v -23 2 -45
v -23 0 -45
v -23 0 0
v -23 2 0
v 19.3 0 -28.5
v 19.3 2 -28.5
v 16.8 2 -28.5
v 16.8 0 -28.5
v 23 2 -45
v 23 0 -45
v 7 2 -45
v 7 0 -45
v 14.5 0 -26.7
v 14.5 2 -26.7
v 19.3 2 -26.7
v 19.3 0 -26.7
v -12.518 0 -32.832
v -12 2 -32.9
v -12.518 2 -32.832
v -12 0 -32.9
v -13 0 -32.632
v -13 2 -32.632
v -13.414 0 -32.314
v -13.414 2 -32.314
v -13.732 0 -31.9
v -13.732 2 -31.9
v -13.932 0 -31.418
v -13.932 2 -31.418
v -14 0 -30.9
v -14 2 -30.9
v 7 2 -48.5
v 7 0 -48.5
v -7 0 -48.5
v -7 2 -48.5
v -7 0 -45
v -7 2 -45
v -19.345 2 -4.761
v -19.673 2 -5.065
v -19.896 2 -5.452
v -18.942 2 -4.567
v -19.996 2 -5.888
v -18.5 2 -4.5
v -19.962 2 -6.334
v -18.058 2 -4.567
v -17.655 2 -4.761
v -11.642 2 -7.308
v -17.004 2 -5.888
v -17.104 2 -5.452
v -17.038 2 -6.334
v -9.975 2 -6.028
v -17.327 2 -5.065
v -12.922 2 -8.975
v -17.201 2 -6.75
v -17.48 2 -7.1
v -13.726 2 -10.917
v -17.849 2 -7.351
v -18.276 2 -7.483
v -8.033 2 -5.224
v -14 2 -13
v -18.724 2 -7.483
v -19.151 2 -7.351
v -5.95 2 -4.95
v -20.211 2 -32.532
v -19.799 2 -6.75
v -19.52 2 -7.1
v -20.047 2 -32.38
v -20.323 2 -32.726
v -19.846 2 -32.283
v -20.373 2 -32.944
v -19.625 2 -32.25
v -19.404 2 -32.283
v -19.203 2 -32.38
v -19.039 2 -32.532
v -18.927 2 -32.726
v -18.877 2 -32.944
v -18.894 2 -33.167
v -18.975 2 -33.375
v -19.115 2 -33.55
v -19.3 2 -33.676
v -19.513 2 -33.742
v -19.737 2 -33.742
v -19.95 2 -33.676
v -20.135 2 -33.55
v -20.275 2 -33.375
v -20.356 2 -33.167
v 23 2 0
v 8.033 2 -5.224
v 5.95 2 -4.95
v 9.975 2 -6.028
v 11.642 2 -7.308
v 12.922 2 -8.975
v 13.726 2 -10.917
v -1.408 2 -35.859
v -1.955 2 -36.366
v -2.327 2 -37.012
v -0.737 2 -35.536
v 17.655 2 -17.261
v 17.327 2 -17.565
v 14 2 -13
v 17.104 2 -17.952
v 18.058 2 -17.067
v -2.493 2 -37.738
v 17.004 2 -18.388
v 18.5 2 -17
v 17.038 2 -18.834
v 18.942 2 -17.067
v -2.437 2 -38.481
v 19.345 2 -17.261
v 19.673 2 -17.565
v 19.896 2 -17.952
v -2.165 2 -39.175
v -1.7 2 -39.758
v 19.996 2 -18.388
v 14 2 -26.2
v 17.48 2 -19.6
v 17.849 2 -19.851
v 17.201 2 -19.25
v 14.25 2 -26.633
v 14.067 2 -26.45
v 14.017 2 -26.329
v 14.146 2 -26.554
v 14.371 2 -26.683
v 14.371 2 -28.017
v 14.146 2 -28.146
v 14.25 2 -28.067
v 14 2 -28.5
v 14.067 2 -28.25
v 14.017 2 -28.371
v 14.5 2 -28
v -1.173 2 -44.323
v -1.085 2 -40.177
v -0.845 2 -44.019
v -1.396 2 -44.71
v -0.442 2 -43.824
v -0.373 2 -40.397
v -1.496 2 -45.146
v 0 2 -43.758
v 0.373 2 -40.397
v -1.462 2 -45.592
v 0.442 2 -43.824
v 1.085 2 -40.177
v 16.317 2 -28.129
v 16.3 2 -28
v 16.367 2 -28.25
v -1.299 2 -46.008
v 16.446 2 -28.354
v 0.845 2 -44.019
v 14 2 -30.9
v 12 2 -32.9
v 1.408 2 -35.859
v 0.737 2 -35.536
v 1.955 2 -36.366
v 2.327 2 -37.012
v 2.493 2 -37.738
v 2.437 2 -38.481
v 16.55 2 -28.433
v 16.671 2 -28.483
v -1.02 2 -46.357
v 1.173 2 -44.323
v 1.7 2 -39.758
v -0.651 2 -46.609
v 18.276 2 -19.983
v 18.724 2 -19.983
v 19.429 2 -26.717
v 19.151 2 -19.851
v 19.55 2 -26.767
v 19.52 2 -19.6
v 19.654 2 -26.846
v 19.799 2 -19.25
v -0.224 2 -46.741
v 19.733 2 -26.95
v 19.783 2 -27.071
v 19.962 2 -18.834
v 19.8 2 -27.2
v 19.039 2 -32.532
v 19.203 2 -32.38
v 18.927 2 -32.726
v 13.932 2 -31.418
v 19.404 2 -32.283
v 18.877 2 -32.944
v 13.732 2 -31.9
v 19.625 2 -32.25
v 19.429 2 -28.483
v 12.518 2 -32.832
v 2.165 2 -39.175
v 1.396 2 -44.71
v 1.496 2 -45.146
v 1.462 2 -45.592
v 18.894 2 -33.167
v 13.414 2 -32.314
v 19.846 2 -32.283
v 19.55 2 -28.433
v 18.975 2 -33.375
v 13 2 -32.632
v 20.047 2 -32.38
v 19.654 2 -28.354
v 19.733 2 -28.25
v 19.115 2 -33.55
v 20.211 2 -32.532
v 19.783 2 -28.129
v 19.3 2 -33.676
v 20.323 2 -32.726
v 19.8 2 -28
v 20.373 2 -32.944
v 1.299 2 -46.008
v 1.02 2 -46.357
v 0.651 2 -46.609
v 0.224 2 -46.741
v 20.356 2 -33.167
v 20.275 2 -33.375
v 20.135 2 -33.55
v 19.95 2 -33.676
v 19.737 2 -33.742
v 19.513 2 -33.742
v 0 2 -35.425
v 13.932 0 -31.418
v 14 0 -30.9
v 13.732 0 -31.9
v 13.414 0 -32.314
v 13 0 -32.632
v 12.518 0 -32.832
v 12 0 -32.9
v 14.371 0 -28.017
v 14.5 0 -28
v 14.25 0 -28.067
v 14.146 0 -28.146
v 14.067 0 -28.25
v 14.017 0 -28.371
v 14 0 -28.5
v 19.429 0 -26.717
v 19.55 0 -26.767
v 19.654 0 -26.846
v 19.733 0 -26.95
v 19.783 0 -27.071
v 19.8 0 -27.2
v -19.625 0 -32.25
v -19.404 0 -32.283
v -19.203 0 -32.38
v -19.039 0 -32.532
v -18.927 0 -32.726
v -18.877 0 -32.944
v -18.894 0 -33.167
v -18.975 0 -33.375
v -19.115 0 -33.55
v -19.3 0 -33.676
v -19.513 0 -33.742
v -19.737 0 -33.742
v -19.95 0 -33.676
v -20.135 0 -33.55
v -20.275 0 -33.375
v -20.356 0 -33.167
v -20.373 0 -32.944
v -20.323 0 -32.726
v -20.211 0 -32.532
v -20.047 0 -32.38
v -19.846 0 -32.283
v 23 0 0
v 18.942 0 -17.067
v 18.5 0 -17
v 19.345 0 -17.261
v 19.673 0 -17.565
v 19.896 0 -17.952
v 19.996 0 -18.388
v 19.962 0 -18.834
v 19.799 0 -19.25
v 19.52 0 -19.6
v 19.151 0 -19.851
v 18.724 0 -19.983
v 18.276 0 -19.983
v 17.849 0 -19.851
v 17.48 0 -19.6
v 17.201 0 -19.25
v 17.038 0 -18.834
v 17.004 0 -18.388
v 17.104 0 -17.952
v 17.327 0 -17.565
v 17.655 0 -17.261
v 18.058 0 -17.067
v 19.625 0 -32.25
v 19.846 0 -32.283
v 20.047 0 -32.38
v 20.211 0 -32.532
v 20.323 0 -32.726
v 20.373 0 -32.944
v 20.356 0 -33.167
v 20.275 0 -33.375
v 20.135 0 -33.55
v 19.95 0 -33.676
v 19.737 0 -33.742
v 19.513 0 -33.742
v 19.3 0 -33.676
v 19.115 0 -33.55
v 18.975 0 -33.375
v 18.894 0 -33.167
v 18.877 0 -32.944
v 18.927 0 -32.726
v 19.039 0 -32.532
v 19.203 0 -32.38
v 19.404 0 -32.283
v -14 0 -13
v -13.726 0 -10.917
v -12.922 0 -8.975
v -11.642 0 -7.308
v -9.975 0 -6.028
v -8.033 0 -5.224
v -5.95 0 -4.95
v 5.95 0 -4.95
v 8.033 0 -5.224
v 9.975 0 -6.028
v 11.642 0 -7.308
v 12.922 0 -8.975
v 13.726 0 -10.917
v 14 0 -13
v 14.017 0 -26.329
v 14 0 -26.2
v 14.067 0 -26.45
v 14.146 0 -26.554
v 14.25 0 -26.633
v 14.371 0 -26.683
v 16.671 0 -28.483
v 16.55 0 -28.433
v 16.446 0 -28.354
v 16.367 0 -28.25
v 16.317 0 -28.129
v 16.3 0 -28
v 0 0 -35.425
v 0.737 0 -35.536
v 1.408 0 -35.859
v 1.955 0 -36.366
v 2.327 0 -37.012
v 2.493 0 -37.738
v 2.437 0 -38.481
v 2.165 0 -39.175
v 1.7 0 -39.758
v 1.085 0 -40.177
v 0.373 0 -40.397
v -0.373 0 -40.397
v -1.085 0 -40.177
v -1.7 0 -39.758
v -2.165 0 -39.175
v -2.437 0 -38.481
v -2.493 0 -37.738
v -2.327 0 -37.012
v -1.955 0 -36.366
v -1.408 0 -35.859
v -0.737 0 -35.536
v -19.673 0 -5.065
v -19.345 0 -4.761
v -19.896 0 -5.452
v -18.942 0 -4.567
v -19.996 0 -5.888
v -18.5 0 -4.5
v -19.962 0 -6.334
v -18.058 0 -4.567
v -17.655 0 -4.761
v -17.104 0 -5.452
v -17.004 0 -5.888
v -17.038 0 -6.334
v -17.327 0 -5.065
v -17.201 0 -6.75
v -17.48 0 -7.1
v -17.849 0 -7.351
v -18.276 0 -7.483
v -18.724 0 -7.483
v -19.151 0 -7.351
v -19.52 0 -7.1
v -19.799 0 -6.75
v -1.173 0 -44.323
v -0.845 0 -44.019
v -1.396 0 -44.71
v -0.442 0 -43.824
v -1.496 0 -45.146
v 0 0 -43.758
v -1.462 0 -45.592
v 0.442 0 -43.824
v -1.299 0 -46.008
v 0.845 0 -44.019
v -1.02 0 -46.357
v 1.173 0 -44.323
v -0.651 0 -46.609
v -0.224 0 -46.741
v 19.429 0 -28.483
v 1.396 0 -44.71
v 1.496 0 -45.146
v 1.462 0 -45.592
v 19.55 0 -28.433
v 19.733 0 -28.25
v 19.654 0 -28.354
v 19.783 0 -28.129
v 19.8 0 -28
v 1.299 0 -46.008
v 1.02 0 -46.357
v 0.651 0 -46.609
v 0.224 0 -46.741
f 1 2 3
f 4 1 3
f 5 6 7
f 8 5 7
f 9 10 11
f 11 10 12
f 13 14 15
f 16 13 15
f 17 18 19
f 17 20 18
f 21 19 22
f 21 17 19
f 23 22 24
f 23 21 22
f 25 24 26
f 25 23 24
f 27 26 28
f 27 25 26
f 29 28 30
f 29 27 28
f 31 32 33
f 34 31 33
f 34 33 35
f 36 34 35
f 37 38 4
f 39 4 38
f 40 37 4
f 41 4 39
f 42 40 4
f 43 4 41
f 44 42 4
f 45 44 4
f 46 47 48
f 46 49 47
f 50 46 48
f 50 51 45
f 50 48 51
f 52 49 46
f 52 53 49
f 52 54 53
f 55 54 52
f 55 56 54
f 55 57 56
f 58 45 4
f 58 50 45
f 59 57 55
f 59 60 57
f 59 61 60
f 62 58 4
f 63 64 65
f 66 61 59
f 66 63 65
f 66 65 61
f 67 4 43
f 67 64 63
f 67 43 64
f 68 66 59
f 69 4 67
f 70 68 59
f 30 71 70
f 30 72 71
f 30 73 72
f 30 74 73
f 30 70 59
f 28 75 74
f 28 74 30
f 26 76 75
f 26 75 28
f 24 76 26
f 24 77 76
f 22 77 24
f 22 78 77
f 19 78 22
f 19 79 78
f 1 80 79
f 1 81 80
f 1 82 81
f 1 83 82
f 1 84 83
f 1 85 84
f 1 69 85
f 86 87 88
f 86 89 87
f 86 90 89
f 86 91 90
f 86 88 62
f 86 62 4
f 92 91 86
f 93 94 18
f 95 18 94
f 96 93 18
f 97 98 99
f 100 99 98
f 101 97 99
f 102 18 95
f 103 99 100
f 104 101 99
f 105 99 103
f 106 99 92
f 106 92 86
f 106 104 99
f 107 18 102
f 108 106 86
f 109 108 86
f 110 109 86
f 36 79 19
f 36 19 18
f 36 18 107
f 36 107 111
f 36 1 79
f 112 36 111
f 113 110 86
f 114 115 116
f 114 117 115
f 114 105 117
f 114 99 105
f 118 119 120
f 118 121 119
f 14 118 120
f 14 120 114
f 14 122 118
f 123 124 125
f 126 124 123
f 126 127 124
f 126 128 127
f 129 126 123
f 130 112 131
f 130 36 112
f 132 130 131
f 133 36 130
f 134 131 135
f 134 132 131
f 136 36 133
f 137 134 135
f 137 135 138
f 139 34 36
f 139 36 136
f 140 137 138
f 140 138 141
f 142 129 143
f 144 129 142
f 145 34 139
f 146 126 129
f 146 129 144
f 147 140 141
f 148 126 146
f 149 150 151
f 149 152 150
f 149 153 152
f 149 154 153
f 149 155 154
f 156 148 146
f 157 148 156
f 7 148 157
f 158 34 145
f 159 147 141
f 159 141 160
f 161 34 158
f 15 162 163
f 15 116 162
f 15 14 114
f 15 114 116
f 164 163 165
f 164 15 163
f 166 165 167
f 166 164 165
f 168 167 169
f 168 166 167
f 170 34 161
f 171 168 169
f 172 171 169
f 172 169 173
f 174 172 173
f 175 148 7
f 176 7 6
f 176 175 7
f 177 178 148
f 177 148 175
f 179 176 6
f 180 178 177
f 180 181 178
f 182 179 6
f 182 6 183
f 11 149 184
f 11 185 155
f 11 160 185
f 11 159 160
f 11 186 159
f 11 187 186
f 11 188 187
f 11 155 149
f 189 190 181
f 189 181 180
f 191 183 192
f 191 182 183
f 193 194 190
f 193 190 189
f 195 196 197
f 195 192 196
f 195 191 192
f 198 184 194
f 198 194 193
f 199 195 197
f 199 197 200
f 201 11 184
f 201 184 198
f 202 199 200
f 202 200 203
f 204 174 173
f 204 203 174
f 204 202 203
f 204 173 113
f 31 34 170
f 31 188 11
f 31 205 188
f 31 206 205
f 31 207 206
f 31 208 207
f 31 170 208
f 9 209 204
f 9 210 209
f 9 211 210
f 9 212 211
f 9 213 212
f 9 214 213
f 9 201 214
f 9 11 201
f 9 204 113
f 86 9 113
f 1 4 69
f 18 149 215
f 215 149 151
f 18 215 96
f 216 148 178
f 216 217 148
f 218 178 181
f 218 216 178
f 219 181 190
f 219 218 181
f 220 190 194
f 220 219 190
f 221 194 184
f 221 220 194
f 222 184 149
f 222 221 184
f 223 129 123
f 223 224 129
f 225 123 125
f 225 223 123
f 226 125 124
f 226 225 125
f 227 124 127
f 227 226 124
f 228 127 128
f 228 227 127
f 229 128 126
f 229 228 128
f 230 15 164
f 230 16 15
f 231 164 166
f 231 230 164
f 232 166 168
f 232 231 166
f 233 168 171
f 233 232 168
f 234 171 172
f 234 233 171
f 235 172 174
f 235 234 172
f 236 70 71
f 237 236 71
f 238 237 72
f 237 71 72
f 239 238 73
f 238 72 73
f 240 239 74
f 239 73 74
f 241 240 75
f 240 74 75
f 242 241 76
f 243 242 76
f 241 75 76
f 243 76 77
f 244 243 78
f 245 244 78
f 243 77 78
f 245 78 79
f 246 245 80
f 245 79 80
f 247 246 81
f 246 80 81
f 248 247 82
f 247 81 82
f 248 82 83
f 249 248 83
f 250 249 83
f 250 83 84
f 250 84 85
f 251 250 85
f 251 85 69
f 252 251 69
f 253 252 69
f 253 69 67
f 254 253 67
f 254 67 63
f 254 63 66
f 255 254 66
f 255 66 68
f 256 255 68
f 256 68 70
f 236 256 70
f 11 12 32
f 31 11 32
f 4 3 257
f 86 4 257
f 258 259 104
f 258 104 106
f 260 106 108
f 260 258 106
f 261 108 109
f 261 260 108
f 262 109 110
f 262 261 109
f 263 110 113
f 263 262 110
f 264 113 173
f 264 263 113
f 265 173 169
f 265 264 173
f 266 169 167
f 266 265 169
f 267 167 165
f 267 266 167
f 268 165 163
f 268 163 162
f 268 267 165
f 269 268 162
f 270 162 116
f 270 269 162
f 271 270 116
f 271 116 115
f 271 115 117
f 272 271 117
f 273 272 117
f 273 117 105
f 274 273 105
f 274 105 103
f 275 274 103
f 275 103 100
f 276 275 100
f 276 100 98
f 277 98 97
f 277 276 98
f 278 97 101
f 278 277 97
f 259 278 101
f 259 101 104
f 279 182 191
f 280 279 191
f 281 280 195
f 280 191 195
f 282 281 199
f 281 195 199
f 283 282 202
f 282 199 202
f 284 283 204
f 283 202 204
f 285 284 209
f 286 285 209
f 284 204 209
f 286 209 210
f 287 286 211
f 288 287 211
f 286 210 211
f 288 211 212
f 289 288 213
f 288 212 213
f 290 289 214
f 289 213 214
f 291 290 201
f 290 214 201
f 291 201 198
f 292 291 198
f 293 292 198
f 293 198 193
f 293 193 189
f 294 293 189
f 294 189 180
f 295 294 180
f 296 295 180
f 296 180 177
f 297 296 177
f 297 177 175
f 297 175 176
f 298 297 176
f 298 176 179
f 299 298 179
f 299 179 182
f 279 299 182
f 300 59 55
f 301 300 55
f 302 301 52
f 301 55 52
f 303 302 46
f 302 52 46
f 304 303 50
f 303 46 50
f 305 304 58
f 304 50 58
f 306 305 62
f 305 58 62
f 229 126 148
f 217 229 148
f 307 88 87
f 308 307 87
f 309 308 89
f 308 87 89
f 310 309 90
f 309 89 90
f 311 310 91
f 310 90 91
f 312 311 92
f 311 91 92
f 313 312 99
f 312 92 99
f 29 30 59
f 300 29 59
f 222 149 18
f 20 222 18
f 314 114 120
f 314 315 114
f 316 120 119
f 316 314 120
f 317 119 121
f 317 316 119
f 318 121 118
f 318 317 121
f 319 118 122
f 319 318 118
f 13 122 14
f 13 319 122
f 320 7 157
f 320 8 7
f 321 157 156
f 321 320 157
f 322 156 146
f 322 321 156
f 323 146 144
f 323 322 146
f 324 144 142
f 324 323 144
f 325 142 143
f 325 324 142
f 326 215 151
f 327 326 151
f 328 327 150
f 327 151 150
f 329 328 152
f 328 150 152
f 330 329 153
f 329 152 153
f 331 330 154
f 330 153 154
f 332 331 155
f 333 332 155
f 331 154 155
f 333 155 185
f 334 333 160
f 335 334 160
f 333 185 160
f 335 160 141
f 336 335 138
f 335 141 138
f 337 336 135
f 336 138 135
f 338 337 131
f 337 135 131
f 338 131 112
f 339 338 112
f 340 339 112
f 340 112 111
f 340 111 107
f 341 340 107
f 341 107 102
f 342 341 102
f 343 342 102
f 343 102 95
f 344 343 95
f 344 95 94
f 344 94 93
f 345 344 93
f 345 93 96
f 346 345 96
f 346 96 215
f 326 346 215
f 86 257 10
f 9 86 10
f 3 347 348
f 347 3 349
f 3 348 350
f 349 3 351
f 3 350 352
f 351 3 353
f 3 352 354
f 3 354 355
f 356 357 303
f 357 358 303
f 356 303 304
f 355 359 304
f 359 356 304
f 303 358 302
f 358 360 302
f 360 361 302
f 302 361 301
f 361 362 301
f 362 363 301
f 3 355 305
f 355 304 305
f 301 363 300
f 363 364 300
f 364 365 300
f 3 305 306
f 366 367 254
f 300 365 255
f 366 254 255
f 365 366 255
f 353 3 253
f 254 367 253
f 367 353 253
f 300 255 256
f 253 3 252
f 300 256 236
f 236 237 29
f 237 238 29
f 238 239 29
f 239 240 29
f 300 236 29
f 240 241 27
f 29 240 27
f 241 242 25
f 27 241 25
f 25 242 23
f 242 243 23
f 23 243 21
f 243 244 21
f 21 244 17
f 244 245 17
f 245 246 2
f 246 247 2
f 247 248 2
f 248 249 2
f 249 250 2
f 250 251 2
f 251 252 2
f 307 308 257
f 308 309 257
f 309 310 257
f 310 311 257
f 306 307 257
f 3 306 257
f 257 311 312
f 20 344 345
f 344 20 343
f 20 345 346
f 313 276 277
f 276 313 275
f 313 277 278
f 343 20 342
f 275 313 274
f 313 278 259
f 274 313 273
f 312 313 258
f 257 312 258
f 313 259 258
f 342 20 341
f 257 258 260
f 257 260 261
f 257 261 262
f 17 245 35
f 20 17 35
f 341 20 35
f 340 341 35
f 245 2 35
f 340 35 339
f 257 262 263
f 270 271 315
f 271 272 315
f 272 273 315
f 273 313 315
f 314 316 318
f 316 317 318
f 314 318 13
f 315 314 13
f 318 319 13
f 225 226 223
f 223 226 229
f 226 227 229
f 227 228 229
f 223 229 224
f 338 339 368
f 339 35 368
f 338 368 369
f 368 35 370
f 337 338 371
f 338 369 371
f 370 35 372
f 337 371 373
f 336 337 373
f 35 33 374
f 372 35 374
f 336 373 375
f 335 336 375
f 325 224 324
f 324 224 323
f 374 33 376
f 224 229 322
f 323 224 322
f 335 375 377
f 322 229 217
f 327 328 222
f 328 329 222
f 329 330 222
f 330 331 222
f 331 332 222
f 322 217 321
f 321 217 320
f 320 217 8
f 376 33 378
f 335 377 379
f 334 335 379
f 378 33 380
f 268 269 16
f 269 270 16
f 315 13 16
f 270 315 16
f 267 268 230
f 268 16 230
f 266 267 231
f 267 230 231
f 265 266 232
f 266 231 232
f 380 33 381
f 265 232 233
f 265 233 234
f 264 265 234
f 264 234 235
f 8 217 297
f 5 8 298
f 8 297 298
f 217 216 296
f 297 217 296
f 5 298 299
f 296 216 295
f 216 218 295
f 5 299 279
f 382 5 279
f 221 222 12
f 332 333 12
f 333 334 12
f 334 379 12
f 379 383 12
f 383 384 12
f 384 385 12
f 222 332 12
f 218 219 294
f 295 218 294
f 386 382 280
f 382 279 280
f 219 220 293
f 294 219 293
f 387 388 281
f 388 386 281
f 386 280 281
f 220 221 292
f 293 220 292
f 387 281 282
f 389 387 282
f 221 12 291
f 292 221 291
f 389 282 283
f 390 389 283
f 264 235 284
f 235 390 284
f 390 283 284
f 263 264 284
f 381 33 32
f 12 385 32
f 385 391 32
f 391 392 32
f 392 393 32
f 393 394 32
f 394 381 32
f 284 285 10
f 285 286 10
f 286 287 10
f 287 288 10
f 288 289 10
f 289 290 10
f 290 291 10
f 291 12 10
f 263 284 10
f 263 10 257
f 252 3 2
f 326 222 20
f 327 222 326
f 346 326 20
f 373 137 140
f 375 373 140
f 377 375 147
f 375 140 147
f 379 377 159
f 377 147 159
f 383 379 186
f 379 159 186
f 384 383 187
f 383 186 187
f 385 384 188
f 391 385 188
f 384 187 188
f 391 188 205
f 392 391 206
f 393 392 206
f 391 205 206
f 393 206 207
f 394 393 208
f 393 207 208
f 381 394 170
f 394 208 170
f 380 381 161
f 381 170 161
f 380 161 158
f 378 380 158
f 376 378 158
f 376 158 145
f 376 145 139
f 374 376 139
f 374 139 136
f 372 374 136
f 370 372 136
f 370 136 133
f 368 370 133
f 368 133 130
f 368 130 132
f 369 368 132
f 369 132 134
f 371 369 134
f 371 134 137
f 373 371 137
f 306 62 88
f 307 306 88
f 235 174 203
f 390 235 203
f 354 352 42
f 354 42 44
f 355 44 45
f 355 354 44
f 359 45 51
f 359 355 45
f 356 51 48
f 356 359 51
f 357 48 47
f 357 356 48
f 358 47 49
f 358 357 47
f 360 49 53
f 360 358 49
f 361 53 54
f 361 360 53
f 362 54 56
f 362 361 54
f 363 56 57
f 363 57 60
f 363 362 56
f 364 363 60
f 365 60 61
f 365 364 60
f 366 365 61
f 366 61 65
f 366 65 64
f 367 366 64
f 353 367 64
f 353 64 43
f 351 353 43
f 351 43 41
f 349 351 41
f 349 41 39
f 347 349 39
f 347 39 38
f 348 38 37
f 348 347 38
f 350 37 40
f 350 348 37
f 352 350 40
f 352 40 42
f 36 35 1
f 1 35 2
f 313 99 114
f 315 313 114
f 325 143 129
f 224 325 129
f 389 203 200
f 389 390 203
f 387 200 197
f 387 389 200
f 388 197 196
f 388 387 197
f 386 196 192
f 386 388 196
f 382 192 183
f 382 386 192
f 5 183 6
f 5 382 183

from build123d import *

# Parameters (mm, degrees)
SKETCH1_R          = 1.5
EXTRUDE1_DEPTH     = 2
CUT_EXTRUDE1_DEPTH = 2
FILLET1_R          = 2
CUT_EXTRUDE3_REACH = 55.715
SKETCH3_R          = 1.5
SKETCH3_R_2        = 0.75
SKETCH3_R_3        = 2.5
CUT_EXTRUDE4_REACH = 55.715
FILLET2_R          = 0.5


with BuildPart() as part:
    # Sketch1 → Extrude1 (new body)
    with BuildSketch(Plane(origin=(0, 0, 0), x_dir=(1, 0, 0), z_dir=(0, 1, 0))):
        Polygon((-23, 0), (23, 0), (23, 45), (7, 45), (7, 48.5), (-7, 48.5), (-7, 45), (-23, 45), align=None)
        with Locations(Location((-18.5, 6, 0), (0, 0, 270))):
            Circle(SKETCH1_R, mode=Mode.SUBTRACT)
        with Locations(Location((18.5, 18.5, 0), (0, 0, 270))):
            Circle(SKETCH1_R, mode=Mode.SUBTRACT)
    extrude(amount=EXTRUDE1_DEPTH)

    # Sketch2 → Cut-Extrude1 (cut)
    with BuildSketch(Plane(origin=(0, 2, 0), x_dir=(1, 0, 0), z_dir=(0, 1, 0))):
        with BuildLine():
            Line((-5.95, 4.95), (5.95, 4.95))
            ThreePointArc((5.95, 4.95), (11.642209589, 7.307790411), (14, 13))
            Line((14, 13), (14, 32.9))
            Line((14, 32.9), (-14, 32.9))
            Line((-14, 32.9), (-14, 13))
            ThreePointArc((-14, 13), (-11.642209589, 7.307790411), (-5.95, 4.95))
        make_face()
    extrude(amount=-CUT_EXTRUDE1_DEPTH, mode=Mode.SUBTRACT)

    # Fillet1
    fillet1_edges = [part.edges().sort_by_distance(p)[0] for p in [
        (-14, 1, -32.9),
        (14, 1, -32.9),
    ]]
    fillet(fillet1_edges, radius=FILLET1_R)

    # Sketch3 → Cut-Extrude3 (cut, up to next)
    with BuildSketch(Plane(origin=(0, 2, 0), x_dir=(1, 0, 0), z_dir=(0, 1, 0)), mode=Mode.PRIVATE) as cut_extrude3_sk1:
        with Locations(Location((0, 45.257858412, 0), (0, 0, 270))):
            Circle(SKETCH3_R)
    cut_extrude3_tool1 = extrude(cut_extrude3_sk1.sketch, amount=-CUT_EXTRUDE3_REACH, mode=Mode.PRIVATE) & part.part
    # Sketch3 → Cut-Extrude3 (cut, up to next)
    with BuildSketch(Plane(origin=(0, 2, 0), x_dir=(1, 0, 0), z_dir=(0, 1, 0)), mode=Mode.PRIVATE) as cut_extrude3_sk2:
        with Locations(Location((-19.625, 33, 0), (0, 0, 270))):
            Circle(SKETCH3_R_2)
    cut_extrude3_tool2 = extrude(cut_extrude3_sk2.sketch, amount=-CUT_EXTRUDE3_REACH, mode=Mode.PRIVATE) & part.part
    # Sketch3 → Cut-Extrude3 (cut, up to next)
    with BuildSketch(Plane(origin=(0, 2, 0), x_dir=(1, 0, 0), z_dir=(0, 1, 0)), mode=Mode.PRIVATE) as cut_extrude3_sk3:
        with Locations(Location((19.625, 33, 0), (0, 0, 270))):
            Circle(SKETCH3_R_2)
    cut_extrude3_tool3 = extrude(cut_extrude3_sk3.sketch, amount=-CUT_EXTRUDE3_REACH, mode=Mode.PRIVATE) & part.part
    # Sketch3 → Cut-Extrude3 (cut, up to next)
    with BuildSketch(Plane(origin=(0, 2, 0), x_dir=(1, 0, 0), z_dir=(0, 1, 0)), mode=Mode.PRIVATE) as cut_extrude3_sk4:
        with Locations(Location((0, 37.925, 0), (0, 0, 270))):
            Circle(SKETCH3_R_3)
    cut_extrude3_tool4 = extrude(cut_extrude3_sk4.sketch, amount=-CUT_EXTRUDE3_REACH, mode=Mode.PRIVATE) & part.part
    add(cut_extrude3_tool1.solids().sort_by_distance((0, 2, -45.257858))[0], mode=Mode.SUBTRACT)
    add(cut_extrude3_tool2.solids().sort_by_distance((-19.625, 2, -33))[0], mode=Mode.SUBTRACT)
    add(cut_extrude3_tool3.solids().sort_by_distance((19.625, 2, -33))[0], mode=Mode.SUBTRACT)
    add(cut_extrude3_tool4.solids().sort_by_distance((0, 2, -37.925))[0], mode=Mode.SUBTRACT)

    # Sketch10 → Cut-Extrude4 (cut, up to next)
    with BuildSketch(Plane(origin=(0, 2, 0), x_dir=(1, 0, 0), z_dir=(0, 1, 0)), mode=Mode.PRIVATE) as cut_extrude4_sk1:
        Polygon((14, 26.7), (19.8, 26.7), (19.8, 28.5), (16.3, 28.5), (16.3, 28), (14, 28), align=None)
    cut_extrude4_tool1 = extrude(cut_extrude4_sk1.sketch, amount=-CUT_EXTRUDE4_REACH, mode=Mode.PRIVATE) & part.part
    add(cut_extrude4_tool1.solids().sort_by_distance((17.116631, 2, -27.519537))[0], mode=Mode.SUBTRACT)

    # Fillet2
    fillet2_edges = [part.edges().sort_by_distance(p)[0] for p in [
        (16.3, 1, -28.5),
        (19.8, 1, -28.5),
        (19.8, 1, -26.7),
        (14, 1, -28),
        (14, 1, -26.7),
    ]]
    fillet(fillet2_edges, radius=FILLET2_R - 0.0001)  # a hair under: the kernel refuses the full size


solid = part.part
